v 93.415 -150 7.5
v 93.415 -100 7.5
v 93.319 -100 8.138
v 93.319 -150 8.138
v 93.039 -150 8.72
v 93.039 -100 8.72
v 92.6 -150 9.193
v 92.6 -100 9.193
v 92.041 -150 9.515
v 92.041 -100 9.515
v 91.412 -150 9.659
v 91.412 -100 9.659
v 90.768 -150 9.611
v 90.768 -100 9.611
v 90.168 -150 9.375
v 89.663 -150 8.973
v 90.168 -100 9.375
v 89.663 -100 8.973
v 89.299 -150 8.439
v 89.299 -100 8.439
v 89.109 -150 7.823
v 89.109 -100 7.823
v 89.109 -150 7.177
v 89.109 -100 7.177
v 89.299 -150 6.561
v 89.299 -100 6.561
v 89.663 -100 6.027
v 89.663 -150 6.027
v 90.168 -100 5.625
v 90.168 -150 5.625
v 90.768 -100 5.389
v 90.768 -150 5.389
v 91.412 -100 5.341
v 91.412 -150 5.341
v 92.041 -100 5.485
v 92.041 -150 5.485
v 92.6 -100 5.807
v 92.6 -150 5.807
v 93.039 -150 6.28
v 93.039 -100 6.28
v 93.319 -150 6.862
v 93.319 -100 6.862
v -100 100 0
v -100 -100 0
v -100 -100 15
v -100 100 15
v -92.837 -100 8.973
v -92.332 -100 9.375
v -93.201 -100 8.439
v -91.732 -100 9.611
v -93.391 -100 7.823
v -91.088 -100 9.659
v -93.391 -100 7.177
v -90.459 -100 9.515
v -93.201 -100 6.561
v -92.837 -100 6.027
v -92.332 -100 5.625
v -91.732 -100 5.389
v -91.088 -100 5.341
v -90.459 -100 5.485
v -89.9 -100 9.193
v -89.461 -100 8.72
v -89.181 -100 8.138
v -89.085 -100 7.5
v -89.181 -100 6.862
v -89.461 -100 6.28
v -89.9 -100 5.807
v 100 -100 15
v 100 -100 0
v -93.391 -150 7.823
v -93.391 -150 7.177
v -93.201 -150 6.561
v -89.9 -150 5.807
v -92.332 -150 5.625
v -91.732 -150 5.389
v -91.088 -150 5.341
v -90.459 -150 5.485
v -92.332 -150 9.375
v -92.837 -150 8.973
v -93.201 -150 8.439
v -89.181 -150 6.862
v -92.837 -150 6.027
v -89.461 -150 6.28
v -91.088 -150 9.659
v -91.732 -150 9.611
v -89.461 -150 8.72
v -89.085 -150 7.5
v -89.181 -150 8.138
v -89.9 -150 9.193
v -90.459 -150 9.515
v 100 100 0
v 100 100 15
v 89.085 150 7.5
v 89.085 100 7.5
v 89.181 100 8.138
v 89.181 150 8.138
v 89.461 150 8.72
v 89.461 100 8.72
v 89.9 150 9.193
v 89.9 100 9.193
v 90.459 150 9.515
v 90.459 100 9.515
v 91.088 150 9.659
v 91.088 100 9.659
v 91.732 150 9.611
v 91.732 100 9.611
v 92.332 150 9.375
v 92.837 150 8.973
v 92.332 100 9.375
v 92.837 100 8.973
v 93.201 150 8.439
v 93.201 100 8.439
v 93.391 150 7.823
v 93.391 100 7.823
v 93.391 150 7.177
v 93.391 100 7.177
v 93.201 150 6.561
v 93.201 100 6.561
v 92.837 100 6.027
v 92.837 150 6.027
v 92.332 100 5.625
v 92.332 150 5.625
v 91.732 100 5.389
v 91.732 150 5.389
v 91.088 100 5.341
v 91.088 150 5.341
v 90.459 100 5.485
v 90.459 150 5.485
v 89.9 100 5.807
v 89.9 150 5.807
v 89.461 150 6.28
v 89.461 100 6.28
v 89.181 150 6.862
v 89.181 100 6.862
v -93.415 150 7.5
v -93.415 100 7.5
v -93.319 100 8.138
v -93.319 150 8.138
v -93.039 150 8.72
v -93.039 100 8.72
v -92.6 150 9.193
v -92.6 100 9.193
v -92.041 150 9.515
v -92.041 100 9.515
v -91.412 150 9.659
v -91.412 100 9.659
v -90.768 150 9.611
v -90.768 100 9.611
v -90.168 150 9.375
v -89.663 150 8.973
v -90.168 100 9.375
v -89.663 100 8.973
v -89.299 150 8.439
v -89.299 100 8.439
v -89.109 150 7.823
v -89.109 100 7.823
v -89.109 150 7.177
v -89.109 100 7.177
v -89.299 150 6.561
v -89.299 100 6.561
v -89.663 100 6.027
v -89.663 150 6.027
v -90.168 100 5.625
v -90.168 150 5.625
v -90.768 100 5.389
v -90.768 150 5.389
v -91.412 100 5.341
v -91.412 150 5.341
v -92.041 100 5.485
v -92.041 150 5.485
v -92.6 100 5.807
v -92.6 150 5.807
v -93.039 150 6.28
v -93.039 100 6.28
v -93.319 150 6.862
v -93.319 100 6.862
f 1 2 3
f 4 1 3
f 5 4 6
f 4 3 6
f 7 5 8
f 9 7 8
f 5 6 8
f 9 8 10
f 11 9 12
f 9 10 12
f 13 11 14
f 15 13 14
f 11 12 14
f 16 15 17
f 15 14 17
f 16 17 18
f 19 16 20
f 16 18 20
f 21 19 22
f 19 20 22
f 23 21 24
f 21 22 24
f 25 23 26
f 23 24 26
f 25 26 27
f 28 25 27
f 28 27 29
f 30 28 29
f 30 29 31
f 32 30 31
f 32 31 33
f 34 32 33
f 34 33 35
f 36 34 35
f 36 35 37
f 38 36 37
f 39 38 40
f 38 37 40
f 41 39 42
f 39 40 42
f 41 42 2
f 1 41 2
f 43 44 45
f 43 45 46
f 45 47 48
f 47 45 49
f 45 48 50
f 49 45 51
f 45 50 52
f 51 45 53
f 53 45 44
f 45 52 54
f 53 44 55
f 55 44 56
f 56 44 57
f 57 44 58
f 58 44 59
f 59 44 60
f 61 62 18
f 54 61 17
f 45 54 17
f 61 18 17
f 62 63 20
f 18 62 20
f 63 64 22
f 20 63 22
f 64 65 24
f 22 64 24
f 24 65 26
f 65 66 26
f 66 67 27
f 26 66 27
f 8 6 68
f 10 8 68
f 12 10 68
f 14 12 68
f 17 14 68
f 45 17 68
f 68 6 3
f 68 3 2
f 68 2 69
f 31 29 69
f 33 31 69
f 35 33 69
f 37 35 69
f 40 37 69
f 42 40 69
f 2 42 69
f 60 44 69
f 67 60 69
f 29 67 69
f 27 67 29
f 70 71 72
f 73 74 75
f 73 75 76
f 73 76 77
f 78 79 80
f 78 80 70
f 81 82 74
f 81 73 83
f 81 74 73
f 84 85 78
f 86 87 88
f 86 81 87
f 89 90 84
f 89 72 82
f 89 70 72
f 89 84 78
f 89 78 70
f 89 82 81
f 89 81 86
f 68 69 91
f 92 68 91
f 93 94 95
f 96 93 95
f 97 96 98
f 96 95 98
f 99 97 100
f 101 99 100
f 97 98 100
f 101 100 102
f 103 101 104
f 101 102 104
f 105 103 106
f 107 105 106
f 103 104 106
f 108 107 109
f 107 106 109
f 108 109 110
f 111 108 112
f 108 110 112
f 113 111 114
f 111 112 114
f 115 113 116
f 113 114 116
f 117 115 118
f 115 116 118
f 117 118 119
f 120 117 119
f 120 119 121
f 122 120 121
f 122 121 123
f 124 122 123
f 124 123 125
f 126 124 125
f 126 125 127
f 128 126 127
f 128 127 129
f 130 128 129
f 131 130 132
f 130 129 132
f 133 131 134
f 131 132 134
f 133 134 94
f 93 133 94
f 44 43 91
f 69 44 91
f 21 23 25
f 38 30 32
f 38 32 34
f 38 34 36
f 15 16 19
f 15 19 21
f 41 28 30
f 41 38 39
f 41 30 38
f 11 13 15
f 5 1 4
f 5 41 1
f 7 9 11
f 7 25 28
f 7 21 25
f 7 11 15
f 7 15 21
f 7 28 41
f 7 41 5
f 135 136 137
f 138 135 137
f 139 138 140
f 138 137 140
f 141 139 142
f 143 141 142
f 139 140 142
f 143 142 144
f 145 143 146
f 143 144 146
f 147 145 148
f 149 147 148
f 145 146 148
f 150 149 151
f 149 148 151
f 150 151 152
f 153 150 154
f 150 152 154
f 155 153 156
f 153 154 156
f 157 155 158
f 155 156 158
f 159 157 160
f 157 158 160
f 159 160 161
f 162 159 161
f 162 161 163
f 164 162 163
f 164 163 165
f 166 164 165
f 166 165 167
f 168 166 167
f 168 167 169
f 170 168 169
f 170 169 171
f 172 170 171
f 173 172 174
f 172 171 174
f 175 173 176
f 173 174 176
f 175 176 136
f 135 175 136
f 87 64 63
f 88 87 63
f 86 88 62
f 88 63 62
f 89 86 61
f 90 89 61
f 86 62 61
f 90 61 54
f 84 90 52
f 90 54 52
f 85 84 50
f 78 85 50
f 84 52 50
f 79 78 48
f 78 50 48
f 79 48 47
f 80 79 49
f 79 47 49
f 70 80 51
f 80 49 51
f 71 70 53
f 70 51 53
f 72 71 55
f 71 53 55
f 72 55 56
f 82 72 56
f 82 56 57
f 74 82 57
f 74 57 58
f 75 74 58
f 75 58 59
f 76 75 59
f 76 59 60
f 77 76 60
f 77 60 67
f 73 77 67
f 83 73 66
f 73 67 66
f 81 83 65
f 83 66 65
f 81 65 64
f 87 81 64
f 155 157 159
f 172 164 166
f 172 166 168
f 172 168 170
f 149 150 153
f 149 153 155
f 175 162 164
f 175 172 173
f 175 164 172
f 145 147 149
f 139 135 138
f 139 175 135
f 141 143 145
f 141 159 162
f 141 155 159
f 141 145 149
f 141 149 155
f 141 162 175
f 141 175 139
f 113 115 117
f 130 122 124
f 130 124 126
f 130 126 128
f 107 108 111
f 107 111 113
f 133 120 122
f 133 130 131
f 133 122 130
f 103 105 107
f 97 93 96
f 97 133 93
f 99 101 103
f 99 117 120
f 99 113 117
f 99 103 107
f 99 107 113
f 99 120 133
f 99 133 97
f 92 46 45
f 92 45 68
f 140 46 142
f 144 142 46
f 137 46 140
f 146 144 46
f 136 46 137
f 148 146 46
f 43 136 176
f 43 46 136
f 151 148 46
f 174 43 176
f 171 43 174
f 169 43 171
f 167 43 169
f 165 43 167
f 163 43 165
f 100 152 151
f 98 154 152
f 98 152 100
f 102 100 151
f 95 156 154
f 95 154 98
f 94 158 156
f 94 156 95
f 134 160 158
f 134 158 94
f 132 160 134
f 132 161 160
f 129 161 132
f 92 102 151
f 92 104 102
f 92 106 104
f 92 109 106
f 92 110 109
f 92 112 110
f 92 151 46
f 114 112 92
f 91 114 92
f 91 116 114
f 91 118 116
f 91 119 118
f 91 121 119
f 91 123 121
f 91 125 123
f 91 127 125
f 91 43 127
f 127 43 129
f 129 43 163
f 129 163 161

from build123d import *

# Parameters (mm, degrees)
F0_W     = 200
F0_H     = 200
F1_DEPTH = 15
F2_R     = 2.165
F3_DEPTH = 50
F4_R     = 2.165
F5_DEPTH = 50


with BuildPart() as f1:
    # F0 (on Top) → F1 (new body)
    with BuildSketch(Plane.XY):
        Rectangle(F0_W, F0_H)
    extrude(amount=F1_DEPTH)

    # F2 (on face) → F3 (join)
    with BuildSketch(Plane(origin=(0, 100, 0), x_dir=(-1, 0, 0), z_dir=(0, 1, 0))):
        with Locations((-91.25, 7.5)):
            Circle(F2_R)
        with Locations((91.25, 7.5)):
            Circle(F2_R)
    extrude(amount=F3_DEPTH)

    # F4 (on face) → F5 (join)
    with BuildSketch(Plane.XZ.offset(100)):
        with Locations((-91.25, 7.5)):
            Circle(F4_R)
        with Locations((91.25, 7.5)):
            Circle(F4_R)
    extrude(amount=F5_DEPTH)


solid = f1.part
